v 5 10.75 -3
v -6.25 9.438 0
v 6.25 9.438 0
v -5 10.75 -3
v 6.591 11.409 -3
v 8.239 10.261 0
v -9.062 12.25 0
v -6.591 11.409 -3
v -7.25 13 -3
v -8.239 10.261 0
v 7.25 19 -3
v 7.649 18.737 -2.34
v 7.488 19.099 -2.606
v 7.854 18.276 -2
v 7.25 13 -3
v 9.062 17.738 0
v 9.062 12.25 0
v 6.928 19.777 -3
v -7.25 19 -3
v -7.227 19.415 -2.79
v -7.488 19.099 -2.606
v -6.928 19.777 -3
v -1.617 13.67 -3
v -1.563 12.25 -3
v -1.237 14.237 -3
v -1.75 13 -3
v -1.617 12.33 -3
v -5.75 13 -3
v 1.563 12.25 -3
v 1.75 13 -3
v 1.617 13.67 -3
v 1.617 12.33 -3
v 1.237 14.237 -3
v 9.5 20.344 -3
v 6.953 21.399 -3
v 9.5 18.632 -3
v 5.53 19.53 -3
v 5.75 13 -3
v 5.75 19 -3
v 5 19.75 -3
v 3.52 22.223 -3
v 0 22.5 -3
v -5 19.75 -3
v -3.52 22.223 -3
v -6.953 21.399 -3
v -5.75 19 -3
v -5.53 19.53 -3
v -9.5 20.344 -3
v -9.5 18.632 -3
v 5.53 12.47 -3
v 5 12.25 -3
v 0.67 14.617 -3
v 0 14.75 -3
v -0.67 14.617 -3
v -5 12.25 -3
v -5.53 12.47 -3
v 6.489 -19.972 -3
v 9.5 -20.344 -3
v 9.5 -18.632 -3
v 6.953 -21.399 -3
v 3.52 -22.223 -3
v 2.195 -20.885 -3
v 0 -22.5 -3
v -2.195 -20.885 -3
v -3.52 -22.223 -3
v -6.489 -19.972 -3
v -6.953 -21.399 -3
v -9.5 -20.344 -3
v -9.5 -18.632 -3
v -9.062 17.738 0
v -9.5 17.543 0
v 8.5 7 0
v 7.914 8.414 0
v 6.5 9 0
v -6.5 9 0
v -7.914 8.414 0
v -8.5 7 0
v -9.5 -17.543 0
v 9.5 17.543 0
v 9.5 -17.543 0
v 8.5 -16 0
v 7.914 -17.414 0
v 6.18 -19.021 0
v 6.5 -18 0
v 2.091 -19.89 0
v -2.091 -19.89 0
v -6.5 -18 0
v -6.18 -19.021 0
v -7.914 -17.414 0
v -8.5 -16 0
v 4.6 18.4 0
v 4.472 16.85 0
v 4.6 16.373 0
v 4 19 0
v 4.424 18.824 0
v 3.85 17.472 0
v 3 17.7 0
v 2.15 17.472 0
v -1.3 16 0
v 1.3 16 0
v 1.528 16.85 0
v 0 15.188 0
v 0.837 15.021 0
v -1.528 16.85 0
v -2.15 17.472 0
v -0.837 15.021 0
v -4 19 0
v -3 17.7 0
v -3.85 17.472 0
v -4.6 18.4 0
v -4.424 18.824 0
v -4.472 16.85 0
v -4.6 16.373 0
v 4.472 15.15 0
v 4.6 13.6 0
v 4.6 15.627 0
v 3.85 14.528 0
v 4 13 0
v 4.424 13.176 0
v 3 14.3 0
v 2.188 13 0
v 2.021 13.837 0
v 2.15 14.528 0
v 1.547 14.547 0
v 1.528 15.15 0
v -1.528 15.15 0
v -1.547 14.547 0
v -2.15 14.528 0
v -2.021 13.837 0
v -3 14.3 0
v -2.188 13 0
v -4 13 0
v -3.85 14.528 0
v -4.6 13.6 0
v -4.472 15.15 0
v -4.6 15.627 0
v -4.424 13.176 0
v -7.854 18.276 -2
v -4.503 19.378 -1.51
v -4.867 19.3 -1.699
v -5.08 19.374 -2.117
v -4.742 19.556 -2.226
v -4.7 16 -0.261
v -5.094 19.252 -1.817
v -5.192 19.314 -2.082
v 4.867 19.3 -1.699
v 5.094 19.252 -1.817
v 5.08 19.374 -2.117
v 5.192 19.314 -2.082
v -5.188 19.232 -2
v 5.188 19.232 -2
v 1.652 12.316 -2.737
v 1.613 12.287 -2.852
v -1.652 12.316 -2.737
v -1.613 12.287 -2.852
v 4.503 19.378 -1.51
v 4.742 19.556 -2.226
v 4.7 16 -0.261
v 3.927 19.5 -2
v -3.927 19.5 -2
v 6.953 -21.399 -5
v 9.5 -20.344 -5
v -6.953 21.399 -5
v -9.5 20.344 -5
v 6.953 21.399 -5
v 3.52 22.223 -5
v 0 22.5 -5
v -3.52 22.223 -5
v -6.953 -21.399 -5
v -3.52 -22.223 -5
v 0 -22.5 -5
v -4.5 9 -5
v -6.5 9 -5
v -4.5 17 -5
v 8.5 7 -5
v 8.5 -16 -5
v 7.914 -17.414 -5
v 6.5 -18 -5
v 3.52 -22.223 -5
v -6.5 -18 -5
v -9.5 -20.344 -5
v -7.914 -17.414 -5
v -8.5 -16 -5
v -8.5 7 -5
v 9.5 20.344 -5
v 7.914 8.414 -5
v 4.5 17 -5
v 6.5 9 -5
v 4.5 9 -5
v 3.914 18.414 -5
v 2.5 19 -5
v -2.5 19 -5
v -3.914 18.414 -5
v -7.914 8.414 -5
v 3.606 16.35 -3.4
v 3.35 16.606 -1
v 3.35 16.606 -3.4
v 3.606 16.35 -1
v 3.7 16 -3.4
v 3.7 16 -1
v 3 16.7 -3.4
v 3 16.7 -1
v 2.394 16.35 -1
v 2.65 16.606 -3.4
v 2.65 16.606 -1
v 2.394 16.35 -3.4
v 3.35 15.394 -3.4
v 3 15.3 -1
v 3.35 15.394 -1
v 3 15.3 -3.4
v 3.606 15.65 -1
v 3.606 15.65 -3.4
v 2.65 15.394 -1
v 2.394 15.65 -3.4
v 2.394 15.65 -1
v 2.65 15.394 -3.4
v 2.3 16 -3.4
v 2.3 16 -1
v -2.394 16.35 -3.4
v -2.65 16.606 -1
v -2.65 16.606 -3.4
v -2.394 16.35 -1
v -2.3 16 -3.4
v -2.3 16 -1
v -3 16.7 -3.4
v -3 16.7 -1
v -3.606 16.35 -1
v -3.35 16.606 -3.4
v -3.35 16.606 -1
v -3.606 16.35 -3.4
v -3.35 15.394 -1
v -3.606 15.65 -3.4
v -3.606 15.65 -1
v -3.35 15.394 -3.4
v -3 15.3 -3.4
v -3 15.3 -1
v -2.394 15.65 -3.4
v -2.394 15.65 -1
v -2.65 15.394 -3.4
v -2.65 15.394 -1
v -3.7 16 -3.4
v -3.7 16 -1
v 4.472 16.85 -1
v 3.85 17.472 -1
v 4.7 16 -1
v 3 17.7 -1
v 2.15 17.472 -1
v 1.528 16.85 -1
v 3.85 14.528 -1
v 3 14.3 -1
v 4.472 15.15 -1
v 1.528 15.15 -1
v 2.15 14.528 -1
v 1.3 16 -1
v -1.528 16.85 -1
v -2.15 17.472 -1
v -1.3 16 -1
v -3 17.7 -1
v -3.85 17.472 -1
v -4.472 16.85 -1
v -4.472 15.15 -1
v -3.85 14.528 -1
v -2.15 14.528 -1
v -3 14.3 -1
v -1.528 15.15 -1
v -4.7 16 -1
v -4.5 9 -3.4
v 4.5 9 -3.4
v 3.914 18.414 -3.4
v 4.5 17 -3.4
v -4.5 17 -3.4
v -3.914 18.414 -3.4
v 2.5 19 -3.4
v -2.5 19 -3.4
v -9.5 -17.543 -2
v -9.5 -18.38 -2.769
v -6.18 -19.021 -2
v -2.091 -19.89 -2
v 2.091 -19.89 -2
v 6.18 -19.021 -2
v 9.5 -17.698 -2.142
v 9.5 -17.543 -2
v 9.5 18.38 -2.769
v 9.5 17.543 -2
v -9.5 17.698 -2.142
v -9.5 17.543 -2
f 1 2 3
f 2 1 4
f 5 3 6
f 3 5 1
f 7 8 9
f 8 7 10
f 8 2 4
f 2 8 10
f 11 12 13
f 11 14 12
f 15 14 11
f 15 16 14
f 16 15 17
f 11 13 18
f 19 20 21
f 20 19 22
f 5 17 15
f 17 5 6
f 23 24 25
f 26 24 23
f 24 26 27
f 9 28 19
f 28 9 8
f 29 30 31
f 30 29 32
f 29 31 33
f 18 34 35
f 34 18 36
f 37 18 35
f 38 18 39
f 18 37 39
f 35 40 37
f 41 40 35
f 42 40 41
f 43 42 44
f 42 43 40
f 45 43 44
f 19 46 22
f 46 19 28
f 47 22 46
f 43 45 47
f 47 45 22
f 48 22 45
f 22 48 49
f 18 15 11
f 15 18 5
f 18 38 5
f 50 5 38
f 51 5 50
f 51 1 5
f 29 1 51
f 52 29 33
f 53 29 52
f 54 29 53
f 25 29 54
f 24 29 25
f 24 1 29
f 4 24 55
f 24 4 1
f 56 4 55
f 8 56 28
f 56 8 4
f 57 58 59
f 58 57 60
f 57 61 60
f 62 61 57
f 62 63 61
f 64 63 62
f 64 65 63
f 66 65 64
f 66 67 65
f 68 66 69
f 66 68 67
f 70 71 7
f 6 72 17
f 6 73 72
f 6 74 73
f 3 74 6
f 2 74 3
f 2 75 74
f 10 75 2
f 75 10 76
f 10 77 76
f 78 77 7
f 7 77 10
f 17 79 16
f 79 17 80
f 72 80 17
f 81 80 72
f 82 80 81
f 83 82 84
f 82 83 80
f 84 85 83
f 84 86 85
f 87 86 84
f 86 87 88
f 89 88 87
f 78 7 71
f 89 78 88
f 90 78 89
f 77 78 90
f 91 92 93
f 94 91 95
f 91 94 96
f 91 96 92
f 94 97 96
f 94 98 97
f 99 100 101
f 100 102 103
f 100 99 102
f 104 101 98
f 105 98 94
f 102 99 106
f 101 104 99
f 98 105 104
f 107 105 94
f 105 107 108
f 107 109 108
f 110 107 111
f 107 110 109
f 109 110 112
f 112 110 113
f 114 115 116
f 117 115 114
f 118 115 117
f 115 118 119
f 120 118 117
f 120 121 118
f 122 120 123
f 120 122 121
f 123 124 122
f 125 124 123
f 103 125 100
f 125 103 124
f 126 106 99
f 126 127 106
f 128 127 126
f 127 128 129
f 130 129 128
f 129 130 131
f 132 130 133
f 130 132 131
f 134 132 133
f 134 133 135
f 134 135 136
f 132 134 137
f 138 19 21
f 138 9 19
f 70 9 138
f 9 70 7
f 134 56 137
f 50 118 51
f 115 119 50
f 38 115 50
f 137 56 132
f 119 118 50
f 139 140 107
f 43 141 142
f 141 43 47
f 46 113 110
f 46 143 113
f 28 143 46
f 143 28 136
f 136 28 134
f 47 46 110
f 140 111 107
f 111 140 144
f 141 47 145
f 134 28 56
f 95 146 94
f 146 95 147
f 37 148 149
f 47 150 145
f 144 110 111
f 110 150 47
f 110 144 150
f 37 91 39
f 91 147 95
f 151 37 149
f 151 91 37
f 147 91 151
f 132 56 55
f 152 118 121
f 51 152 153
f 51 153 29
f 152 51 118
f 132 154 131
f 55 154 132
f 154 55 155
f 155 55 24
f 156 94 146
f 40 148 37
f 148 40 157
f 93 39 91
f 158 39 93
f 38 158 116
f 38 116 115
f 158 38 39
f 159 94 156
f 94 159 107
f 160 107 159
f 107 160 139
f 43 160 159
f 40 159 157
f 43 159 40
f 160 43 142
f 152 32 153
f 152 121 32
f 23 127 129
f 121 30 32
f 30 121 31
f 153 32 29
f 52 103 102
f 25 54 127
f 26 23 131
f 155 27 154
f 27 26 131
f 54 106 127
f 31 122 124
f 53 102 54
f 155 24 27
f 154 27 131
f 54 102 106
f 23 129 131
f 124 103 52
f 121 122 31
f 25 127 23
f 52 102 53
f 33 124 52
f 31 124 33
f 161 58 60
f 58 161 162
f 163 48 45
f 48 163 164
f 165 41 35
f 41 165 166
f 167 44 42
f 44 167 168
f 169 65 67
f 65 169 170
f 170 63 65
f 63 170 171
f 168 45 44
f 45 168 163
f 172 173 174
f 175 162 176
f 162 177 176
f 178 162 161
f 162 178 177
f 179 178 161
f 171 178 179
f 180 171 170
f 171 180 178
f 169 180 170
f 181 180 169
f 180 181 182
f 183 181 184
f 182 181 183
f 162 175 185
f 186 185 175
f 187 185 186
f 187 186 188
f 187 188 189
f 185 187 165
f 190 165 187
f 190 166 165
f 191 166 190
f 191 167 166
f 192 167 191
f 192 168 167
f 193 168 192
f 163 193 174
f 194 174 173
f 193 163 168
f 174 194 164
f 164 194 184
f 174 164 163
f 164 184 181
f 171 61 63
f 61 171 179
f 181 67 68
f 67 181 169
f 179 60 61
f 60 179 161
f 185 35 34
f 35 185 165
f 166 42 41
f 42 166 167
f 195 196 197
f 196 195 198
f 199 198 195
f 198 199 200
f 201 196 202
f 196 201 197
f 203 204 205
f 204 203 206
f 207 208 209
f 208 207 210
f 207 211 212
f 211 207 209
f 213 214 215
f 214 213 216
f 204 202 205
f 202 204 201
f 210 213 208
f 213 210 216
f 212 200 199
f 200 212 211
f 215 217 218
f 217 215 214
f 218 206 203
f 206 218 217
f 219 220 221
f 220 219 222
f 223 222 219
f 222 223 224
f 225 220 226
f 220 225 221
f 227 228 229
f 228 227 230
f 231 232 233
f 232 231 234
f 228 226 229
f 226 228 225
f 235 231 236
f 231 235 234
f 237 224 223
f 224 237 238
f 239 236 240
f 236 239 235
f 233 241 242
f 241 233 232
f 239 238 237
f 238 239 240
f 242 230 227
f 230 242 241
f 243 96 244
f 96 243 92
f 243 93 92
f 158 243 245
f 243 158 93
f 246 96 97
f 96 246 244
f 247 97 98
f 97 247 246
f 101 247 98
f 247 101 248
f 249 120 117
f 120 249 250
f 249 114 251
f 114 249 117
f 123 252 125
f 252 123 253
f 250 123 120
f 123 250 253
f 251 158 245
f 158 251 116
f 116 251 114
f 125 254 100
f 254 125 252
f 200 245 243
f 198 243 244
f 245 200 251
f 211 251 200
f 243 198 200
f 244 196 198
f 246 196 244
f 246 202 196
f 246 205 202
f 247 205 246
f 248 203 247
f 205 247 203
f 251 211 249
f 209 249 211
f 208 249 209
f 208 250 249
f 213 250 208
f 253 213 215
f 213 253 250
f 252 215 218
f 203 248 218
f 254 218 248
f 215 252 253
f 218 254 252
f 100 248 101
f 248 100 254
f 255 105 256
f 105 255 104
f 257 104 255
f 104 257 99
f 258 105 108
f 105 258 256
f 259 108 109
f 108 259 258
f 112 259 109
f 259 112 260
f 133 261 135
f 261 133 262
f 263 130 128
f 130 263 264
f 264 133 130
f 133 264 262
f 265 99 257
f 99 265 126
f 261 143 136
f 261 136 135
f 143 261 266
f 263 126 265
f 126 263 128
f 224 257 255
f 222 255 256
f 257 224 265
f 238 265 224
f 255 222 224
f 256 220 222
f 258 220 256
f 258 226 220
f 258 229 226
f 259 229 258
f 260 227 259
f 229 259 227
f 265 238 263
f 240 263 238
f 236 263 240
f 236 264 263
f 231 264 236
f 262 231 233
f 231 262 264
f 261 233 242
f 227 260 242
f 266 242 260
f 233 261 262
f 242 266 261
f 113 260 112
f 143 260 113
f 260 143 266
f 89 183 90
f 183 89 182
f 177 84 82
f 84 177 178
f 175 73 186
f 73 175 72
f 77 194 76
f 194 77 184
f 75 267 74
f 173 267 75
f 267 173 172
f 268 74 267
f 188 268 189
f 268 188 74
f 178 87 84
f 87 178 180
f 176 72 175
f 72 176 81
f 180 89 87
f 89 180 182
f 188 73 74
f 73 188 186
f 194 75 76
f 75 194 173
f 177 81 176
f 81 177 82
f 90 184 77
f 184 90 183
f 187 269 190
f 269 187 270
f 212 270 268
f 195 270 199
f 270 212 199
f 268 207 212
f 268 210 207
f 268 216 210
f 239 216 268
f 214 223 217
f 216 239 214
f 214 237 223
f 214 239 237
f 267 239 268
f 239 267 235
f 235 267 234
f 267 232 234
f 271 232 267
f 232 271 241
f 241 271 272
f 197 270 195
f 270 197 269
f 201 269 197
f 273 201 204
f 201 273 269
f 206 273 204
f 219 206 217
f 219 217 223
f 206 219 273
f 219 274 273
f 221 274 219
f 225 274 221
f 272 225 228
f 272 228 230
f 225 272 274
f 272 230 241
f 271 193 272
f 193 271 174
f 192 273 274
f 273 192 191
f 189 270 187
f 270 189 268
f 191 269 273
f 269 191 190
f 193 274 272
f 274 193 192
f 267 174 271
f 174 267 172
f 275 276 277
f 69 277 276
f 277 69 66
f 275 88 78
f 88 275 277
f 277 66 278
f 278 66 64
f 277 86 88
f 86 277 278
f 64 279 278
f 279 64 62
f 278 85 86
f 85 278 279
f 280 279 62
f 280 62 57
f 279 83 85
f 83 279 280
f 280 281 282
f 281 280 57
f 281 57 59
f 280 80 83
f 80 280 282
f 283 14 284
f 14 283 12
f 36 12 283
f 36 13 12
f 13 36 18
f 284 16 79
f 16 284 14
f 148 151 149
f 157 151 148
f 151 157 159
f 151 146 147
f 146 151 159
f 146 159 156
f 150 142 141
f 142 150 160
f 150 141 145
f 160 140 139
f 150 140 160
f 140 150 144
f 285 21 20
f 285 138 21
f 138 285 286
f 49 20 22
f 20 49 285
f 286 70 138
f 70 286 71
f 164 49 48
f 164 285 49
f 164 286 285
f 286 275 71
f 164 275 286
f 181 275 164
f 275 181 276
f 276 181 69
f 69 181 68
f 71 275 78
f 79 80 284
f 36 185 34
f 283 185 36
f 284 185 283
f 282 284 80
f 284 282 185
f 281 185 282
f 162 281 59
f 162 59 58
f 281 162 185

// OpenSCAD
tol=0.25;

intersection(){

translate([0,0,-5]) color("gray"){
linear_extrude(height=6) square(size=[19,60],center=true);
}

difference(){
    translate([0,0,-5]) color("pink"){
        cylinder(r=22.5,h=5,$fn=40);
    }
    

difference(){

// Base boss
    union(){
        translate([0,0,0]) color("yellow")
        linear_extrude(height=9)  circle(r=30,center=true);

        // This is the pogo pin surround
        translate([0,16,-3]) color("green"){
            difference(){
                linear_extrude(height=3,scale=1.25)
                offset(r=2+tol,$fn=8) square(size=[10,6],center=true);

                linear_extrude(height=3,scale=0.8)
                offset(r=1-tol,$fn=8) square(size=[10,6],center=true);
            }
            translate([0,-3,0]) color("orange")
            linear_extrude(height=3,scale=1.25)  circle(r=1.5+tol,$fn=16,center=true);
        }
    }

} // end of top boss difference cuts   

    // holes for pogo pins
    translate([3,16,-6]) cylinder(r=0.7,h=6,$fn=12);
    translate([-3,16,-6]) cylinder(r=0.7,h=6,$fn=12);
    translate([3,16,-1])  cylinder(r=1.7,h=1,$fn=12);
    translate([-3,16,-1]) cylinder(r=1.7,h=1,$fn=12);

    // remove extra material
    translate([0,-4.5,-6]) linear_extrude(height=6,scale=1.0)
    offset(r=2,$fn=8) square(size=[13,23],center=true);

    // cutout to allow wires lay flat
    translate([0,12,-5.4]) linear_extrude(height=2)
    offset(r=2,$fn=8) square(size=[5,10],center=true);

    // Bottom side boss
    pb1=[ [24-tol,0], [20,0], [20,3], [21,4], [24-tol,4], [24-tol,3],
    [23-tol,2], [24-tol,1] ];
    translate([0,0,1]) rotate([180,0,0]) color("orange")
    rotate_extrude(convexity=20) polygon(points=pb1);
/*
    // cut text for Brights
    translate ([0,-20,-4.6]) rotate([180,0,0]) color("red") 
    linear_extrude(height=0.4){
    text("BB-1C", font = "Open Sans:style=Bold", size=2.5,halign="center",valign="center",spacing=1.1);
    }
*/
}
}
